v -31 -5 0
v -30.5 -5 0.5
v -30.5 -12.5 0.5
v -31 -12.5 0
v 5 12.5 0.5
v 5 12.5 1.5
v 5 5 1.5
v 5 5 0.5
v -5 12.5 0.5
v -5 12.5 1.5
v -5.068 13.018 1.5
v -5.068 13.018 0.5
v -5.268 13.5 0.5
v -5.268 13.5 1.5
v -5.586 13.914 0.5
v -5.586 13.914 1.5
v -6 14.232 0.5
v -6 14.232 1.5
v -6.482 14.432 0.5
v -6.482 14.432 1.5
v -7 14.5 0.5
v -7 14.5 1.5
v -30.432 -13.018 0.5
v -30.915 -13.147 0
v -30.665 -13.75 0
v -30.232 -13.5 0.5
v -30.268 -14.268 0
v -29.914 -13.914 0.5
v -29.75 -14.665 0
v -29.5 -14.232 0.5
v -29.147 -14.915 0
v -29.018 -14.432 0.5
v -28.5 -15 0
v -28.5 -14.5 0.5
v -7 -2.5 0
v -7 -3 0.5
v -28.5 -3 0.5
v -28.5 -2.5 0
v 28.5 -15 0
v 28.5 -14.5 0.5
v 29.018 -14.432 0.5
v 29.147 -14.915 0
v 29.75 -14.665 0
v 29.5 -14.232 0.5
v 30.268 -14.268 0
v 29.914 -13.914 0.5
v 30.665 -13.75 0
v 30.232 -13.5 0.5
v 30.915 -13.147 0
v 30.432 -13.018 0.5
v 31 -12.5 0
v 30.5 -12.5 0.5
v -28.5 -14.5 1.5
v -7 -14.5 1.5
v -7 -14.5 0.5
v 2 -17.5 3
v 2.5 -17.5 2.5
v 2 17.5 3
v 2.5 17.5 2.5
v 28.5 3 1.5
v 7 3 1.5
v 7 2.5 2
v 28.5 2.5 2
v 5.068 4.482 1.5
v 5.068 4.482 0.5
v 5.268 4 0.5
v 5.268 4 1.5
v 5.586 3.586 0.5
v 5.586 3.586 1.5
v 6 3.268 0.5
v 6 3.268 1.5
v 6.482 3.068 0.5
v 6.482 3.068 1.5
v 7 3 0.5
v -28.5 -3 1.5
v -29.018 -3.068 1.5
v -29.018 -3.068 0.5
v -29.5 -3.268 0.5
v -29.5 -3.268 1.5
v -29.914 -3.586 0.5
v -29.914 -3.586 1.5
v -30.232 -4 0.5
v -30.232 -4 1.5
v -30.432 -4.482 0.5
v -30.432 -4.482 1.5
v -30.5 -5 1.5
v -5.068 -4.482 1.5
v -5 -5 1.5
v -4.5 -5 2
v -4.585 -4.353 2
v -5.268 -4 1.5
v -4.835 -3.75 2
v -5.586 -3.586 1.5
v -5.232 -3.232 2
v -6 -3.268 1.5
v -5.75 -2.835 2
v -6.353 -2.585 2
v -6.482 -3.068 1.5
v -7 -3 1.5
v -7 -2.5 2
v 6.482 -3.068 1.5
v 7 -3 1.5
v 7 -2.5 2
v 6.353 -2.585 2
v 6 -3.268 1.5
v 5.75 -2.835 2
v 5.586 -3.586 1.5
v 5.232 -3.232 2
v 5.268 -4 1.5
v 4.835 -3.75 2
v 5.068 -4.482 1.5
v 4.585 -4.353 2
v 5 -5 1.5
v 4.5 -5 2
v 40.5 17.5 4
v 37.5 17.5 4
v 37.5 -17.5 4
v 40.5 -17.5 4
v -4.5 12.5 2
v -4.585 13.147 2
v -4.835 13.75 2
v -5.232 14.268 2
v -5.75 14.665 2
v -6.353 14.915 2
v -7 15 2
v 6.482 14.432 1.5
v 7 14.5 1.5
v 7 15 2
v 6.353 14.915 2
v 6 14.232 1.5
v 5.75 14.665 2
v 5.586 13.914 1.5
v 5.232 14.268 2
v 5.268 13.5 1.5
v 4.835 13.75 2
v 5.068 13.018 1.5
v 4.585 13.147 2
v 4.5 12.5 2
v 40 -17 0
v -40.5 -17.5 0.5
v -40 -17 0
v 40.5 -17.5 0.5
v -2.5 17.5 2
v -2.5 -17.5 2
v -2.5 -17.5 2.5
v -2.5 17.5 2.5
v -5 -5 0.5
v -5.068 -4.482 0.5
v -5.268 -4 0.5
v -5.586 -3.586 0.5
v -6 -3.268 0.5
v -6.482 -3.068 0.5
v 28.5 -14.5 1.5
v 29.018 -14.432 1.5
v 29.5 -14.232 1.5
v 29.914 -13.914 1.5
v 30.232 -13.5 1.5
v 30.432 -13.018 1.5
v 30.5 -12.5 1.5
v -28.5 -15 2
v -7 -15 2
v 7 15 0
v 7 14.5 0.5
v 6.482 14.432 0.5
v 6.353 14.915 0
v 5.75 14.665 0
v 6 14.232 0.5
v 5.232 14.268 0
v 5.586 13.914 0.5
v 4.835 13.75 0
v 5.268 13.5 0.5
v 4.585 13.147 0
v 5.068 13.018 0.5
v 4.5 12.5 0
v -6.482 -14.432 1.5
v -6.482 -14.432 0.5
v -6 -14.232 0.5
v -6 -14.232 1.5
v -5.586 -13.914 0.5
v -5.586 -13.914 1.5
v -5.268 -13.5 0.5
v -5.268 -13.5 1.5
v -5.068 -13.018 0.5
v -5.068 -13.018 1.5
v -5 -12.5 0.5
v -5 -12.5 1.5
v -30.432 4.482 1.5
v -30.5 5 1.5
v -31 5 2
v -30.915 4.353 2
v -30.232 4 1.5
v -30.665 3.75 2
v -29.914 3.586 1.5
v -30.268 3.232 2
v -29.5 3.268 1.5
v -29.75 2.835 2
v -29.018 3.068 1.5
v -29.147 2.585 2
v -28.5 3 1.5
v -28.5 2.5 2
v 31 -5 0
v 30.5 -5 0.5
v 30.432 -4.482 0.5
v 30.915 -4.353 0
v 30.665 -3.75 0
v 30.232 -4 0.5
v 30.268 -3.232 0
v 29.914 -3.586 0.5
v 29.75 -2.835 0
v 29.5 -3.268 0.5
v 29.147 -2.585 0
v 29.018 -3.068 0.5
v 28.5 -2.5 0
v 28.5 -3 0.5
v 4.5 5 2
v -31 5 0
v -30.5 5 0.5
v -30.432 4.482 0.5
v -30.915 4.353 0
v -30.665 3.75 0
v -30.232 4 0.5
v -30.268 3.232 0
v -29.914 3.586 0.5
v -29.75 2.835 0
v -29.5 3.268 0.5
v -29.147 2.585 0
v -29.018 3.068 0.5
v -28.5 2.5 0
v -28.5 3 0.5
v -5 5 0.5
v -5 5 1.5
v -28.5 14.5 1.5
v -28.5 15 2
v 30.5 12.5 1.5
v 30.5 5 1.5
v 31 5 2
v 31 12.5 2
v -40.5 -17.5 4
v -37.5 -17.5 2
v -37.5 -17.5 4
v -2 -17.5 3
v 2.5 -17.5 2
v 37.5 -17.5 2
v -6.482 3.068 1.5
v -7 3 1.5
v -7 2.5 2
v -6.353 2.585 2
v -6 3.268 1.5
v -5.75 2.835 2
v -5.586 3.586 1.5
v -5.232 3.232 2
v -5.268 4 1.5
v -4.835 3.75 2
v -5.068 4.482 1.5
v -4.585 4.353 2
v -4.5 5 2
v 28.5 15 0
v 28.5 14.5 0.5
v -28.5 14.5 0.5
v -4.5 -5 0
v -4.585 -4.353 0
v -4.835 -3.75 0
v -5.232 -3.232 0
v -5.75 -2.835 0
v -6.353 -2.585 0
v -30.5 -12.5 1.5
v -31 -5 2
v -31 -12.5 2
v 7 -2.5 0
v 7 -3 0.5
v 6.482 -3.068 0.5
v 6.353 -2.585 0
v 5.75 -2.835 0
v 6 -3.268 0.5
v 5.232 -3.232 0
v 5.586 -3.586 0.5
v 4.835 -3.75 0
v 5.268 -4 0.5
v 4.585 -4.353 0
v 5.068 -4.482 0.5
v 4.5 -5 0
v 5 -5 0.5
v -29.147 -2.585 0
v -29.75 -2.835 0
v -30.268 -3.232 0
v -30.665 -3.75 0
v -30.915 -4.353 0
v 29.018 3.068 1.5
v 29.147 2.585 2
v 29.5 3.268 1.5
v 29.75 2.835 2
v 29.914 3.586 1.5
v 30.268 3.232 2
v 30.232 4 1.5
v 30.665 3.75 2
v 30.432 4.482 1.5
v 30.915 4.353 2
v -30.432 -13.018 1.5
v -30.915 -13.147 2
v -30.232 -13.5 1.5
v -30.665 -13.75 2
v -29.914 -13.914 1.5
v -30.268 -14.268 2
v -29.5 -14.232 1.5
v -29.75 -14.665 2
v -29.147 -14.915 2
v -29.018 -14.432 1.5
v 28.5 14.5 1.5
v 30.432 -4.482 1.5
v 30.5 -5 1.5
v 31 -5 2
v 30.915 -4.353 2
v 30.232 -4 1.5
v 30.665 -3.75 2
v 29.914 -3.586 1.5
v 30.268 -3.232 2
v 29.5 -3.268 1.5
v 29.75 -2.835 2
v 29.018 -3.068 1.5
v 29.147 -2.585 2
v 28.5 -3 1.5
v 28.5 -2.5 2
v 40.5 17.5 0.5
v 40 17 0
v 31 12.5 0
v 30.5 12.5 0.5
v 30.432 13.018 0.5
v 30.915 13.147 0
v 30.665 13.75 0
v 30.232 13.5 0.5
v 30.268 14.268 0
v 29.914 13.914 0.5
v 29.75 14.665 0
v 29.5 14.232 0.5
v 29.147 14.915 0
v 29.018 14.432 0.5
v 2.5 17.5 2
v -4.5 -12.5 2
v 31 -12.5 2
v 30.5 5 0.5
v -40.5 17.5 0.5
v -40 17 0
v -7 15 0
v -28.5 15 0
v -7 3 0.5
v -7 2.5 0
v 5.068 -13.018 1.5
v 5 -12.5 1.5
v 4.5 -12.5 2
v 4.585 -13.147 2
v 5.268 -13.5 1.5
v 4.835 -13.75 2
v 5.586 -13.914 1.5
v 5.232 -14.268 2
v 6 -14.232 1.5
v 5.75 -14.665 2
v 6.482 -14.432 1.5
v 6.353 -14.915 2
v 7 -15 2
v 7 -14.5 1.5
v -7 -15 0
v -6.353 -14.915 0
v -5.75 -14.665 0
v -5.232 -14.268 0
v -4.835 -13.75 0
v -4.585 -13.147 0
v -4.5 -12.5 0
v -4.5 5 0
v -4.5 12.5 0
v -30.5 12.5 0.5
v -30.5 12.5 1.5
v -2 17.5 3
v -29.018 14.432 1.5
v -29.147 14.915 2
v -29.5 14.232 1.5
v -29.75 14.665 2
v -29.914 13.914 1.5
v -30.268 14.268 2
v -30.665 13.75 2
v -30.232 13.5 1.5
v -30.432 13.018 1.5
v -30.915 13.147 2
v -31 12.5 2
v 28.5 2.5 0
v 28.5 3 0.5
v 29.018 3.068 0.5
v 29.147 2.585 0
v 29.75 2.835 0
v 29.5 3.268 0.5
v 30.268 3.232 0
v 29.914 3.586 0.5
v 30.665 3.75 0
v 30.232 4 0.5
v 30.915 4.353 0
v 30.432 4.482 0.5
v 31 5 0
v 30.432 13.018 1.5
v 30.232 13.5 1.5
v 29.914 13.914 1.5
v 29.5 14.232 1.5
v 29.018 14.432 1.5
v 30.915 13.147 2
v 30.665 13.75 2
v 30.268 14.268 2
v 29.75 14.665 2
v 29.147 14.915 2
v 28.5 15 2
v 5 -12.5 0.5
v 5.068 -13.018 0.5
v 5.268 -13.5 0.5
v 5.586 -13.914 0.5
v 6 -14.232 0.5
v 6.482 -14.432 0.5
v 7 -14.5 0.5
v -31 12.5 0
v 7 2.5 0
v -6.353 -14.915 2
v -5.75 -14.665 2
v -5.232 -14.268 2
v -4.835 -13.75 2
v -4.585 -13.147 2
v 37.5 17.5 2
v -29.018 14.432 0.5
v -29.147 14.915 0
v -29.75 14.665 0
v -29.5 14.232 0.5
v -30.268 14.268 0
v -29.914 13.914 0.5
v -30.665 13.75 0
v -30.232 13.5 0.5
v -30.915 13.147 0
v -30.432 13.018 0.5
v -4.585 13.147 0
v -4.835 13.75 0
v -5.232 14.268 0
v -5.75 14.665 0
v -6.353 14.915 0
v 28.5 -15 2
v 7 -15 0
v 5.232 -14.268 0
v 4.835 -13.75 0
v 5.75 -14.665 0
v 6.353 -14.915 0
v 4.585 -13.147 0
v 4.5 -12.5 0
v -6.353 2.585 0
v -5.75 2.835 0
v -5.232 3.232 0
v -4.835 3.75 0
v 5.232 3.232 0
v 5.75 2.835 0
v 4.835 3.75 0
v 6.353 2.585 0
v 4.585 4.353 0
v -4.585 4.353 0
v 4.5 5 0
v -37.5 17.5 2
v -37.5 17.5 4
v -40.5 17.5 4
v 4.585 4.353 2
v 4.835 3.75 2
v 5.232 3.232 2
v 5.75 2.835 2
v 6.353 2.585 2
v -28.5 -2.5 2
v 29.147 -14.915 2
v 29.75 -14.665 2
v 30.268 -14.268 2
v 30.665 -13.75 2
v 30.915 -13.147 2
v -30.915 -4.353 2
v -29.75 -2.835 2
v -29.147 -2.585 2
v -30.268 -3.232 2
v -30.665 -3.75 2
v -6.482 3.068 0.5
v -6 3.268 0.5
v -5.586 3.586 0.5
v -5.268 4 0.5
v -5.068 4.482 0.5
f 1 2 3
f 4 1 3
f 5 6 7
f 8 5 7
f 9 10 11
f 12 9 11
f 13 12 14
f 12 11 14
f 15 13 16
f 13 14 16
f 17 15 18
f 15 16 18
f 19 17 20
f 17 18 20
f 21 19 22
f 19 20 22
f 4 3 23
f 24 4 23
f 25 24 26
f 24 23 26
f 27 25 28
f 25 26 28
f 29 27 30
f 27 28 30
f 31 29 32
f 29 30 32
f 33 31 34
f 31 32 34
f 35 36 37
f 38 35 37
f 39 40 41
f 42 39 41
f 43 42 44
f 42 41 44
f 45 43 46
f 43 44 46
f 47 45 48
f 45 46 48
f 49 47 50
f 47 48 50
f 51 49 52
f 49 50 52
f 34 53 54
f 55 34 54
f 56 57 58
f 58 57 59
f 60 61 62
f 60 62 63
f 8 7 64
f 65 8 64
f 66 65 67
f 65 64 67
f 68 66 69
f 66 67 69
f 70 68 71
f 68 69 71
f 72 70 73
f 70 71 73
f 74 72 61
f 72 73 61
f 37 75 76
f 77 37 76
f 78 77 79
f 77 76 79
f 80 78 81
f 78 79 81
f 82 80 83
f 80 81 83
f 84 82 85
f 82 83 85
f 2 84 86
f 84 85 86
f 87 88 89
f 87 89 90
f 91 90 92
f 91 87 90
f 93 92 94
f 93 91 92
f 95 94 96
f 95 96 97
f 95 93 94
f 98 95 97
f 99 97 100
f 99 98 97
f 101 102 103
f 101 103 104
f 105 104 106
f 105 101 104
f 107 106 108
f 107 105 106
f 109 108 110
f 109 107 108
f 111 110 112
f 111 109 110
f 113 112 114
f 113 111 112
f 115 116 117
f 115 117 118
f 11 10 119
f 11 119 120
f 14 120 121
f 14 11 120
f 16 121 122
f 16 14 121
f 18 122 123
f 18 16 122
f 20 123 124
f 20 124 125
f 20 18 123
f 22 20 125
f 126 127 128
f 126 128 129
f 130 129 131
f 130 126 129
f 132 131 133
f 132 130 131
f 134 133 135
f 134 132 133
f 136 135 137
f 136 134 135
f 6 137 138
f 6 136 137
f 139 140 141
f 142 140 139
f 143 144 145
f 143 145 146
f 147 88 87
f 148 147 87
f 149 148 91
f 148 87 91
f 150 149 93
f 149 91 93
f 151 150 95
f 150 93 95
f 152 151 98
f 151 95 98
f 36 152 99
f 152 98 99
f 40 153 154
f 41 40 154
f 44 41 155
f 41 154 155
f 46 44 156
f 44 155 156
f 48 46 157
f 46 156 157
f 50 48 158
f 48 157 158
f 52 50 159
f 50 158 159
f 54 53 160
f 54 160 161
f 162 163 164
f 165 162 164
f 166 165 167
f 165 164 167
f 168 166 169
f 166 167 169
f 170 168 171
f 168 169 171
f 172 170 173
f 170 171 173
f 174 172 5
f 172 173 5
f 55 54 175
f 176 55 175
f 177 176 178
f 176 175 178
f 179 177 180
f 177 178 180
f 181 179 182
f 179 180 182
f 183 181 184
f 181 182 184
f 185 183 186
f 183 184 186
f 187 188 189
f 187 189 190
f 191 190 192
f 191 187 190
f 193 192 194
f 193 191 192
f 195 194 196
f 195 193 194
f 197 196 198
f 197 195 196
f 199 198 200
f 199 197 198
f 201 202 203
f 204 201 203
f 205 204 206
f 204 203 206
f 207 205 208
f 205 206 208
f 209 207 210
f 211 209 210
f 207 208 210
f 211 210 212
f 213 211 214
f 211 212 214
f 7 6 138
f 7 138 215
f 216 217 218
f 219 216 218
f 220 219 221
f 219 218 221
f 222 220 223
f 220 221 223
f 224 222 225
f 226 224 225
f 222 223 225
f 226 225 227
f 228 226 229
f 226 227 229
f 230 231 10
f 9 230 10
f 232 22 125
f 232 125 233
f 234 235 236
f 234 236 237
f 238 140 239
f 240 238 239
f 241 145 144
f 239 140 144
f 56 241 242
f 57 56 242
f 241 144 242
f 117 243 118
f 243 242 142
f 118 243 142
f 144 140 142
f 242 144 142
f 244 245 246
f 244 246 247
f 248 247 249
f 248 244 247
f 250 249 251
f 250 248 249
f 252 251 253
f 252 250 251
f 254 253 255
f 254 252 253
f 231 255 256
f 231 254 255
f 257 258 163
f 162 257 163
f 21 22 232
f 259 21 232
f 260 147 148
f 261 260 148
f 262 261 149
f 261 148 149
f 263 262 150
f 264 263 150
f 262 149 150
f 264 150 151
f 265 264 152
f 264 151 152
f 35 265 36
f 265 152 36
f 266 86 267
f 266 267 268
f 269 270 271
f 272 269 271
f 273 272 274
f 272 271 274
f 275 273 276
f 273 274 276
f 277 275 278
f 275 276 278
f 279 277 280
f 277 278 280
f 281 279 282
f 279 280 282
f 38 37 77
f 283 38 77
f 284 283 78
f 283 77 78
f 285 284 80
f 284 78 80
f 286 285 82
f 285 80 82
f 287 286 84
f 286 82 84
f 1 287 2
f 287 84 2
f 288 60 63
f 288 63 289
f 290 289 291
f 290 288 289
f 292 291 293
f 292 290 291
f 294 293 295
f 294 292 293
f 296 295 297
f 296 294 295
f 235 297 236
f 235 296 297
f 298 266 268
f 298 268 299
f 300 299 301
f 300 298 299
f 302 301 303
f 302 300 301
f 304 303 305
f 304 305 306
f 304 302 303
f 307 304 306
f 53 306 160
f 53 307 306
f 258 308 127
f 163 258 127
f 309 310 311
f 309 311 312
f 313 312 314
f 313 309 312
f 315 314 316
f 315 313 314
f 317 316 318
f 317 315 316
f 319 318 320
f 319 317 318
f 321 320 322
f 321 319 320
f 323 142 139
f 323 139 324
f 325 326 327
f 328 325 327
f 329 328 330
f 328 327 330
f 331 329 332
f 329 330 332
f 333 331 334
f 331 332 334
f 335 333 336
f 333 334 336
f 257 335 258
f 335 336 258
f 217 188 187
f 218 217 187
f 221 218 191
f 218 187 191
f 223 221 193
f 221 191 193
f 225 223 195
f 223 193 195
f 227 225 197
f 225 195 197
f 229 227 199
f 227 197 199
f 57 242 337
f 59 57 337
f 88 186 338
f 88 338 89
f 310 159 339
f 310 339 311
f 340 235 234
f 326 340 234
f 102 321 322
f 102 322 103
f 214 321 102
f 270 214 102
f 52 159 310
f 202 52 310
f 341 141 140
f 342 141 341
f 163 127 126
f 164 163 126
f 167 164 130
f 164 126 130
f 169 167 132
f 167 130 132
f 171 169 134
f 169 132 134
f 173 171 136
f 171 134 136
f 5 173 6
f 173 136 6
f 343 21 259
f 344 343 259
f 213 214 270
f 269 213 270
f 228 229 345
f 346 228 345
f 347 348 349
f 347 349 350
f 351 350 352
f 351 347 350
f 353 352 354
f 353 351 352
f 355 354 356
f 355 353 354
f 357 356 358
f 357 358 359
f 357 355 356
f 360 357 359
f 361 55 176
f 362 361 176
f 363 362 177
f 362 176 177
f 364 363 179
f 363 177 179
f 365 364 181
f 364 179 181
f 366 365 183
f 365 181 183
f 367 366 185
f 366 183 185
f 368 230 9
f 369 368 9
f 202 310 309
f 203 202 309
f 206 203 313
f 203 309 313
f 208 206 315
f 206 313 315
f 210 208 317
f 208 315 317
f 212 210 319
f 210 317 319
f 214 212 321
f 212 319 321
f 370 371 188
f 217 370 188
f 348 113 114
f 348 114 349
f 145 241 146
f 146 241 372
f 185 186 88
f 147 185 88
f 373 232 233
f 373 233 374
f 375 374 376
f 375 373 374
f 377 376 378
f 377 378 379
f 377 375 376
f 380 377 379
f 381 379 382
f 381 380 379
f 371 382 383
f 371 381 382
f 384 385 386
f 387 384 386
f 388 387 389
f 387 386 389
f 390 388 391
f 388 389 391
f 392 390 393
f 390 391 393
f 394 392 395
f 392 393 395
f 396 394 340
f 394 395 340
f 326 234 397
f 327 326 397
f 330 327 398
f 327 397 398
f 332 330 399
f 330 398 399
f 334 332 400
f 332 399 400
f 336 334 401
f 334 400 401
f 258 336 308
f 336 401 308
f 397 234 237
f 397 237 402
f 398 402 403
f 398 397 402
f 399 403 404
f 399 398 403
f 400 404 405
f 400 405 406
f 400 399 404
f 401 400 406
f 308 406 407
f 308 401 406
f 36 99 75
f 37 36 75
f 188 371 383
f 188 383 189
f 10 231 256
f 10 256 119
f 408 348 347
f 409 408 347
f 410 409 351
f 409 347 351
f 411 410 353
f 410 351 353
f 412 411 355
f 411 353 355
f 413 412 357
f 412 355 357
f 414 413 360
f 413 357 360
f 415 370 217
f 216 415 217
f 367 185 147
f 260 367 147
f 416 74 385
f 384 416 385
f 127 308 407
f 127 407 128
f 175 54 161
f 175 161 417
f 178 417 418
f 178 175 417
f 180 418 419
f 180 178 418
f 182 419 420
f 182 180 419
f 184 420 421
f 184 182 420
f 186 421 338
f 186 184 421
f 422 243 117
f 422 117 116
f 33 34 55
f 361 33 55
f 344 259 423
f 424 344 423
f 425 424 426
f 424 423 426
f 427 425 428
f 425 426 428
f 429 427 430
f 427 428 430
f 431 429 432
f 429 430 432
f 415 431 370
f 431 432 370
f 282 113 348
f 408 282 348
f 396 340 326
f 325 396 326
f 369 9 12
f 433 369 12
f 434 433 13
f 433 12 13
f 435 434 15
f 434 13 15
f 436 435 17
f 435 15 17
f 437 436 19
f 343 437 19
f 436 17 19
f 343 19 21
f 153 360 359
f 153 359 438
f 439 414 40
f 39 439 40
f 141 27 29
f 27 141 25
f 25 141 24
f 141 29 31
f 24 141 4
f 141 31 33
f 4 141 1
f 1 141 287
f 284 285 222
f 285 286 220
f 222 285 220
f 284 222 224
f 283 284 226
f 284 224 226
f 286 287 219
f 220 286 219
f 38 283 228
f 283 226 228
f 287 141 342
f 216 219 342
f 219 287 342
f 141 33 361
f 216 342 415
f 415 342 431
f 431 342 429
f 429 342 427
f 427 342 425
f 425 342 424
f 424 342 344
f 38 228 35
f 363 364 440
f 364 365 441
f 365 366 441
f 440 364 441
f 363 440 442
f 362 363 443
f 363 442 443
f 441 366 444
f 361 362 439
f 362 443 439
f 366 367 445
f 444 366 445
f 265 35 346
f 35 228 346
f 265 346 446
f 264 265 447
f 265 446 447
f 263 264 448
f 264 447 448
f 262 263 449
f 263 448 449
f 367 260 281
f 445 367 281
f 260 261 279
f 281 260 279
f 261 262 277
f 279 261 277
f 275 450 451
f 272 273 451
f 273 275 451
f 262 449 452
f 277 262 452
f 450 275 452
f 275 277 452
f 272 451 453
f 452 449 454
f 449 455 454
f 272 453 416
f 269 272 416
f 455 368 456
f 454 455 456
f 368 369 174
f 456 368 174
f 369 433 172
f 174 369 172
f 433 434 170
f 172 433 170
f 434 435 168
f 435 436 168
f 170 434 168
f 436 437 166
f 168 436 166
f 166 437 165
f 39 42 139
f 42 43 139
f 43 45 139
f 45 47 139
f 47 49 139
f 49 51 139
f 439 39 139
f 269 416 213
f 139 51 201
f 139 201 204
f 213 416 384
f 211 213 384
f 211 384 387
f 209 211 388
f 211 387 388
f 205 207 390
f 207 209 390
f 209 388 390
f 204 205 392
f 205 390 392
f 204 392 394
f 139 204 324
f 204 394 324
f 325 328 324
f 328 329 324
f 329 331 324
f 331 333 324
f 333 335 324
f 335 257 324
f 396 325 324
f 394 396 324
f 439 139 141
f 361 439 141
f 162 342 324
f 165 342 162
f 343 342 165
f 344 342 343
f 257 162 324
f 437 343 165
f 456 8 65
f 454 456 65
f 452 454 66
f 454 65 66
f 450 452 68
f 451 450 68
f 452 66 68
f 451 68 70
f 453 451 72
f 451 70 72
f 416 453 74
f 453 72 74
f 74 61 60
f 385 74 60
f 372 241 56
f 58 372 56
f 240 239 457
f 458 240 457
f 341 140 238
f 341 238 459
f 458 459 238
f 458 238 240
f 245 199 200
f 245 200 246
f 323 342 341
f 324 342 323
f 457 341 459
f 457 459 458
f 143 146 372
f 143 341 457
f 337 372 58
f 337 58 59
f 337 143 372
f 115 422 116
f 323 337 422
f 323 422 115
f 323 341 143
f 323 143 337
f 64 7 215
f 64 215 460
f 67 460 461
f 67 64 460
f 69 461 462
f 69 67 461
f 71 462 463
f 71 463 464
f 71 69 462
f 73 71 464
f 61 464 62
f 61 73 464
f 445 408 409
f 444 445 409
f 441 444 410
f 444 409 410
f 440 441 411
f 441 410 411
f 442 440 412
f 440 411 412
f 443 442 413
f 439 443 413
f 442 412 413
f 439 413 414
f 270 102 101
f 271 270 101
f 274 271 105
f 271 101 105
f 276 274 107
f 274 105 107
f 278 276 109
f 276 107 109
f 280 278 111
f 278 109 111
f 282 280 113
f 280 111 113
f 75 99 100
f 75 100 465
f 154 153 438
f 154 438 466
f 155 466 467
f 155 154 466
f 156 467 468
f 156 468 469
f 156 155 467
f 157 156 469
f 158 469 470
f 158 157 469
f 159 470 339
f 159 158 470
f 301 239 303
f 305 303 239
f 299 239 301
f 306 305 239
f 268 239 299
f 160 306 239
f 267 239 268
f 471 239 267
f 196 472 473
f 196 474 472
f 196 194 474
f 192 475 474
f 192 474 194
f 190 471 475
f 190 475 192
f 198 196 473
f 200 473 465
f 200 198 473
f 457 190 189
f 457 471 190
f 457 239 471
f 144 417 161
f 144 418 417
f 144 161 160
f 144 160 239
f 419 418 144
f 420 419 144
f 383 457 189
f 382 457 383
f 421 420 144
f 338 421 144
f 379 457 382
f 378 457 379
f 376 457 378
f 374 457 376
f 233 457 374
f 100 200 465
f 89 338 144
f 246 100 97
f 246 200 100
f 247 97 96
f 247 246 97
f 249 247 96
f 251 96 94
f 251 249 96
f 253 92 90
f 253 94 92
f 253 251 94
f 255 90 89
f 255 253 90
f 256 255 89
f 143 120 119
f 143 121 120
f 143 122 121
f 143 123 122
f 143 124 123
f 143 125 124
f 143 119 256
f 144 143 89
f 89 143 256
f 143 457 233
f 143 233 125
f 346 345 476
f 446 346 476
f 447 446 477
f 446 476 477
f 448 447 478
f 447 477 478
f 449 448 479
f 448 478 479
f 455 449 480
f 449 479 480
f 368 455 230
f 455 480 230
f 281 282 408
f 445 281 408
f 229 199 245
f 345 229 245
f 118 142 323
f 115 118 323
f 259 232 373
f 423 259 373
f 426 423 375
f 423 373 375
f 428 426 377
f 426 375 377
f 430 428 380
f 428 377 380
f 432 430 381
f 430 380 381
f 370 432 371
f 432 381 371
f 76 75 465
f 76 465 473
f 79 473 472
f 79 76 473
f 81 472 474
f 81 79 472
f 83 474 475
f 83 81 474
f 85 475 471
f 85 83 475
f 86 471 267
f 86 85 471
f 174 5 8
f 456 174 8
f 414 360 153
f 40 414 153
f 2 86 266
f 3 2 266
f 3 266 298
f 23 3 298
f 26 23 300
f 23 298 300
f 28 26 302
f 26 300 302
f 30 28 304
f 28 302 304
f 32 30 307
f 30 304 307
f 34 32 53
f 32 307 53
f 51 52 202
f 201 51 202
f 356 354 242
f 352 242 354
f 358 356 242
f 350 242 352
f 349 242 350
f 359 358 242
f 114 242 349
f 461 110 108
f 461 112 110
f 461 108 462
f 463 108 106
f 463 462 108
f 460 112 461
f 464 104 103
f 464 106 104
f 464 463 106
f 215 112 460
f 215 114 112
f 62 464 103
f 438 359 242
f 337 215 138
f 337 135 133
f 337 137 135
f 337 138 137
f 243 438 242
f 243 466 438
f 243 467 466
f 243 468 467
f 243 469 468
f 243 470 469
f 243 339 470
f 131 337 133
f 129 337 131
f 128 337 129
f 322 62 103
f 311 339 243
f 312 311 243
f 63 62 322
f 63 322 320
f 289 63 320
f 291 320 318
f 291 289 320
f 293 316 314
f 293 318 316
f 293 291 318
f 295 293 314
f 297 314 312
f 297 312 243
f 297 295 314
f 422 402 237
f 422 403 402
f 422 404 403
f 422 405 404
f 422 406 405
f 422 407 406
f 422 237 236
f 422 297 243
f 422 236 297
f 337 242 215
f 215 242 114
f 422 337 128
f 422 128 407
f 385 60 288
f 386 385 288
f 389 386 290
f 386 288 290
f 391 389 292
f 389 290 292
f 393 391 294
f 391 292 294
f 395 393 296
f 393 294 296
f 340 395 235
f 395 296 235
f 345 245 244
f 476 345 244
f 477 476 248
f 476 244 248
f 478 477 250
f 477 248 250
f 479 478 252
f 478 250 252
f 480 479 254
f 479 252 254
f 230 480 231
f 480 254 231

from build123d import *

# Parameters (mm, degrees)
F0_W     = 81
F0_H     = 35
F1_DEPTH = 2
F2_W     = 5
F2_H     = 35
F3_DEPTH = 1
F4_W     = 3
F4_H     = 35
F5_DEPTH = 2
F7_DEPTH = 2.001
F8_SIZE  = 0.5
F9_SIZE  = 0.5


with BuildPart() as f1:
    # F0 (on Top) → F1 (new body)
    with BuildSketch(Plane.XY):
        Rectangle(F0_W, F0_H)
    extrude(amount=F1_DEPTH)

    # F2 (on face) → F3 (join)
    with BuildSketch(Plane.XY.offset(2)):
        Rectangle(F2_W, F2_H)
    extrude(amount=F3_DEPTH)

    # F4 (on face) → F5 (join)
    with BuildSketch(Plane.XY.offset(2)):
        with Locations((-39, 0)):
            Rectangle(F4_W, F4_H)
        with Locations((39, 0)):
            Rectangle(F4_W, F4_H)
    extrude(amount=F5_DEPTH)

    # F6 (on face) → F7 (cut, through all)
    with BuildSketch(Plane.XY.offset(2)):
        with BuildLine():
            Line((-7, 14.5), (-28.5, 14.5))
            ThreePointArc((-28.5, 14.5), (-29.914214, 13.914214), (-30.5, 12.5))
            Line((-30.5, 12.5), (-30.5, 5))
            ThreePointArc((-30.5, 5), (-29.914214, 3.585786), (-28.5, 3))
            Line((-28.5, 3), (-7, 3))
            ThreePointArc((-7, 3), (-5.585786, 3.585786), (-5, 5))
            Line((-5, 5), (-5, 12.5))
            ThreePointArc((-5, 12.5), (-5.585786, 13.914214), (-7, 14.5))
        make_face()
        with BuildLine():
            Line((-30.5, -5), (-30.5, -12.5))
            ThreePointArc((-30.5, -12.5), (-29.914214, -13.914214), (-28.5, -14.5))
            Line((-28.5, -14.5), (-7, -14.5))
            ThreePointArc((-7, -14.5), (-5.585786, -13.914214), (-5, -12.5))
            Line((-5, -12.5), (-5, -5))
            ThreePointArc((-5, -5), (-5.585786, -3.585786), (-7, -3))
            Line((-7, -3), (-28.5, -3))
            ThreePointArc((-28.5, -3), (-29.914214, -3.585786), (-30.5, -5))
        make_face()
        with BuildLine():
            ThreePointArc((7, 14.5), (5.585786, 13.914214), (5, 12.5))
            Line((5, 12.5), (5, 5))
            ThreePointArc((5, 5), (5.585786, 3.585786), (7, 3))
            Line((7, 3), (28.5, 3))
            ThreePointArc((28.5, 3), (29.914214, 3.585786), (30.5, 5))
            Line((30.5, 5), (30.5, 12.5))
            ThreePointArc((30.5, 12.5), (29.914214, 13.914214), (28.5, 14.5))
            Line((28.5, 14.5), (7, 14.5))
        make_face()
        with BuildLine():
            Line((28.5, -3), (7, -3))
            ThreePointArc((7, -3), (5.585786, -3.585786), (5, -5))
            Line((5, -5), (5, -12.5))
            ThreePointArc((5, -12.5), (5.585786, -13.914214), (7, -14.5))
            Line((7, -14.5), (28.5, -14.5))
            ThreePointArc((28.5, -14.5), (29.914214, -13.914214), (30.5, -12.5))
            Line((30.5, -12.5), (30.5, -5))
            ThreePointArc((30.5, -5), (29.914214, -3.585786), (28.5, -3))
        make_face()
    extrude(amount=-F7_DEPTH, mode=Mode.SUBTRACT)

    # F8
    f8_edges = [f1.edges().sort_by_distance(p)[0] for p in [
        (0, -17.5, 0),
        (40.5, 0, 0),
        (0, 17.5, 0),
        (-40.5, 0, 0),
    ]]
    chamfer(f8_edges, length=F8_SIZE)

    # F9
    f9_edges = [f1.edges().sort_by_distance(p)[0] for p in [
        (2.5, 0, 3),
        (-2.5, 0, 3),
        (17.75, -14.5, 2),
        (17.75, 3, 2),
        (-17.75, -3, 2),
        (-17.75, 3, 2),
        (-17.75, -3, 0),
        (-17.75, 14.5, 0),
        (17.75, 14.5, 0),
        (17.75, -3, 0),
    ]]
    chamfer(f9_edges, length=F9_SIZE)


solid = f1.part
